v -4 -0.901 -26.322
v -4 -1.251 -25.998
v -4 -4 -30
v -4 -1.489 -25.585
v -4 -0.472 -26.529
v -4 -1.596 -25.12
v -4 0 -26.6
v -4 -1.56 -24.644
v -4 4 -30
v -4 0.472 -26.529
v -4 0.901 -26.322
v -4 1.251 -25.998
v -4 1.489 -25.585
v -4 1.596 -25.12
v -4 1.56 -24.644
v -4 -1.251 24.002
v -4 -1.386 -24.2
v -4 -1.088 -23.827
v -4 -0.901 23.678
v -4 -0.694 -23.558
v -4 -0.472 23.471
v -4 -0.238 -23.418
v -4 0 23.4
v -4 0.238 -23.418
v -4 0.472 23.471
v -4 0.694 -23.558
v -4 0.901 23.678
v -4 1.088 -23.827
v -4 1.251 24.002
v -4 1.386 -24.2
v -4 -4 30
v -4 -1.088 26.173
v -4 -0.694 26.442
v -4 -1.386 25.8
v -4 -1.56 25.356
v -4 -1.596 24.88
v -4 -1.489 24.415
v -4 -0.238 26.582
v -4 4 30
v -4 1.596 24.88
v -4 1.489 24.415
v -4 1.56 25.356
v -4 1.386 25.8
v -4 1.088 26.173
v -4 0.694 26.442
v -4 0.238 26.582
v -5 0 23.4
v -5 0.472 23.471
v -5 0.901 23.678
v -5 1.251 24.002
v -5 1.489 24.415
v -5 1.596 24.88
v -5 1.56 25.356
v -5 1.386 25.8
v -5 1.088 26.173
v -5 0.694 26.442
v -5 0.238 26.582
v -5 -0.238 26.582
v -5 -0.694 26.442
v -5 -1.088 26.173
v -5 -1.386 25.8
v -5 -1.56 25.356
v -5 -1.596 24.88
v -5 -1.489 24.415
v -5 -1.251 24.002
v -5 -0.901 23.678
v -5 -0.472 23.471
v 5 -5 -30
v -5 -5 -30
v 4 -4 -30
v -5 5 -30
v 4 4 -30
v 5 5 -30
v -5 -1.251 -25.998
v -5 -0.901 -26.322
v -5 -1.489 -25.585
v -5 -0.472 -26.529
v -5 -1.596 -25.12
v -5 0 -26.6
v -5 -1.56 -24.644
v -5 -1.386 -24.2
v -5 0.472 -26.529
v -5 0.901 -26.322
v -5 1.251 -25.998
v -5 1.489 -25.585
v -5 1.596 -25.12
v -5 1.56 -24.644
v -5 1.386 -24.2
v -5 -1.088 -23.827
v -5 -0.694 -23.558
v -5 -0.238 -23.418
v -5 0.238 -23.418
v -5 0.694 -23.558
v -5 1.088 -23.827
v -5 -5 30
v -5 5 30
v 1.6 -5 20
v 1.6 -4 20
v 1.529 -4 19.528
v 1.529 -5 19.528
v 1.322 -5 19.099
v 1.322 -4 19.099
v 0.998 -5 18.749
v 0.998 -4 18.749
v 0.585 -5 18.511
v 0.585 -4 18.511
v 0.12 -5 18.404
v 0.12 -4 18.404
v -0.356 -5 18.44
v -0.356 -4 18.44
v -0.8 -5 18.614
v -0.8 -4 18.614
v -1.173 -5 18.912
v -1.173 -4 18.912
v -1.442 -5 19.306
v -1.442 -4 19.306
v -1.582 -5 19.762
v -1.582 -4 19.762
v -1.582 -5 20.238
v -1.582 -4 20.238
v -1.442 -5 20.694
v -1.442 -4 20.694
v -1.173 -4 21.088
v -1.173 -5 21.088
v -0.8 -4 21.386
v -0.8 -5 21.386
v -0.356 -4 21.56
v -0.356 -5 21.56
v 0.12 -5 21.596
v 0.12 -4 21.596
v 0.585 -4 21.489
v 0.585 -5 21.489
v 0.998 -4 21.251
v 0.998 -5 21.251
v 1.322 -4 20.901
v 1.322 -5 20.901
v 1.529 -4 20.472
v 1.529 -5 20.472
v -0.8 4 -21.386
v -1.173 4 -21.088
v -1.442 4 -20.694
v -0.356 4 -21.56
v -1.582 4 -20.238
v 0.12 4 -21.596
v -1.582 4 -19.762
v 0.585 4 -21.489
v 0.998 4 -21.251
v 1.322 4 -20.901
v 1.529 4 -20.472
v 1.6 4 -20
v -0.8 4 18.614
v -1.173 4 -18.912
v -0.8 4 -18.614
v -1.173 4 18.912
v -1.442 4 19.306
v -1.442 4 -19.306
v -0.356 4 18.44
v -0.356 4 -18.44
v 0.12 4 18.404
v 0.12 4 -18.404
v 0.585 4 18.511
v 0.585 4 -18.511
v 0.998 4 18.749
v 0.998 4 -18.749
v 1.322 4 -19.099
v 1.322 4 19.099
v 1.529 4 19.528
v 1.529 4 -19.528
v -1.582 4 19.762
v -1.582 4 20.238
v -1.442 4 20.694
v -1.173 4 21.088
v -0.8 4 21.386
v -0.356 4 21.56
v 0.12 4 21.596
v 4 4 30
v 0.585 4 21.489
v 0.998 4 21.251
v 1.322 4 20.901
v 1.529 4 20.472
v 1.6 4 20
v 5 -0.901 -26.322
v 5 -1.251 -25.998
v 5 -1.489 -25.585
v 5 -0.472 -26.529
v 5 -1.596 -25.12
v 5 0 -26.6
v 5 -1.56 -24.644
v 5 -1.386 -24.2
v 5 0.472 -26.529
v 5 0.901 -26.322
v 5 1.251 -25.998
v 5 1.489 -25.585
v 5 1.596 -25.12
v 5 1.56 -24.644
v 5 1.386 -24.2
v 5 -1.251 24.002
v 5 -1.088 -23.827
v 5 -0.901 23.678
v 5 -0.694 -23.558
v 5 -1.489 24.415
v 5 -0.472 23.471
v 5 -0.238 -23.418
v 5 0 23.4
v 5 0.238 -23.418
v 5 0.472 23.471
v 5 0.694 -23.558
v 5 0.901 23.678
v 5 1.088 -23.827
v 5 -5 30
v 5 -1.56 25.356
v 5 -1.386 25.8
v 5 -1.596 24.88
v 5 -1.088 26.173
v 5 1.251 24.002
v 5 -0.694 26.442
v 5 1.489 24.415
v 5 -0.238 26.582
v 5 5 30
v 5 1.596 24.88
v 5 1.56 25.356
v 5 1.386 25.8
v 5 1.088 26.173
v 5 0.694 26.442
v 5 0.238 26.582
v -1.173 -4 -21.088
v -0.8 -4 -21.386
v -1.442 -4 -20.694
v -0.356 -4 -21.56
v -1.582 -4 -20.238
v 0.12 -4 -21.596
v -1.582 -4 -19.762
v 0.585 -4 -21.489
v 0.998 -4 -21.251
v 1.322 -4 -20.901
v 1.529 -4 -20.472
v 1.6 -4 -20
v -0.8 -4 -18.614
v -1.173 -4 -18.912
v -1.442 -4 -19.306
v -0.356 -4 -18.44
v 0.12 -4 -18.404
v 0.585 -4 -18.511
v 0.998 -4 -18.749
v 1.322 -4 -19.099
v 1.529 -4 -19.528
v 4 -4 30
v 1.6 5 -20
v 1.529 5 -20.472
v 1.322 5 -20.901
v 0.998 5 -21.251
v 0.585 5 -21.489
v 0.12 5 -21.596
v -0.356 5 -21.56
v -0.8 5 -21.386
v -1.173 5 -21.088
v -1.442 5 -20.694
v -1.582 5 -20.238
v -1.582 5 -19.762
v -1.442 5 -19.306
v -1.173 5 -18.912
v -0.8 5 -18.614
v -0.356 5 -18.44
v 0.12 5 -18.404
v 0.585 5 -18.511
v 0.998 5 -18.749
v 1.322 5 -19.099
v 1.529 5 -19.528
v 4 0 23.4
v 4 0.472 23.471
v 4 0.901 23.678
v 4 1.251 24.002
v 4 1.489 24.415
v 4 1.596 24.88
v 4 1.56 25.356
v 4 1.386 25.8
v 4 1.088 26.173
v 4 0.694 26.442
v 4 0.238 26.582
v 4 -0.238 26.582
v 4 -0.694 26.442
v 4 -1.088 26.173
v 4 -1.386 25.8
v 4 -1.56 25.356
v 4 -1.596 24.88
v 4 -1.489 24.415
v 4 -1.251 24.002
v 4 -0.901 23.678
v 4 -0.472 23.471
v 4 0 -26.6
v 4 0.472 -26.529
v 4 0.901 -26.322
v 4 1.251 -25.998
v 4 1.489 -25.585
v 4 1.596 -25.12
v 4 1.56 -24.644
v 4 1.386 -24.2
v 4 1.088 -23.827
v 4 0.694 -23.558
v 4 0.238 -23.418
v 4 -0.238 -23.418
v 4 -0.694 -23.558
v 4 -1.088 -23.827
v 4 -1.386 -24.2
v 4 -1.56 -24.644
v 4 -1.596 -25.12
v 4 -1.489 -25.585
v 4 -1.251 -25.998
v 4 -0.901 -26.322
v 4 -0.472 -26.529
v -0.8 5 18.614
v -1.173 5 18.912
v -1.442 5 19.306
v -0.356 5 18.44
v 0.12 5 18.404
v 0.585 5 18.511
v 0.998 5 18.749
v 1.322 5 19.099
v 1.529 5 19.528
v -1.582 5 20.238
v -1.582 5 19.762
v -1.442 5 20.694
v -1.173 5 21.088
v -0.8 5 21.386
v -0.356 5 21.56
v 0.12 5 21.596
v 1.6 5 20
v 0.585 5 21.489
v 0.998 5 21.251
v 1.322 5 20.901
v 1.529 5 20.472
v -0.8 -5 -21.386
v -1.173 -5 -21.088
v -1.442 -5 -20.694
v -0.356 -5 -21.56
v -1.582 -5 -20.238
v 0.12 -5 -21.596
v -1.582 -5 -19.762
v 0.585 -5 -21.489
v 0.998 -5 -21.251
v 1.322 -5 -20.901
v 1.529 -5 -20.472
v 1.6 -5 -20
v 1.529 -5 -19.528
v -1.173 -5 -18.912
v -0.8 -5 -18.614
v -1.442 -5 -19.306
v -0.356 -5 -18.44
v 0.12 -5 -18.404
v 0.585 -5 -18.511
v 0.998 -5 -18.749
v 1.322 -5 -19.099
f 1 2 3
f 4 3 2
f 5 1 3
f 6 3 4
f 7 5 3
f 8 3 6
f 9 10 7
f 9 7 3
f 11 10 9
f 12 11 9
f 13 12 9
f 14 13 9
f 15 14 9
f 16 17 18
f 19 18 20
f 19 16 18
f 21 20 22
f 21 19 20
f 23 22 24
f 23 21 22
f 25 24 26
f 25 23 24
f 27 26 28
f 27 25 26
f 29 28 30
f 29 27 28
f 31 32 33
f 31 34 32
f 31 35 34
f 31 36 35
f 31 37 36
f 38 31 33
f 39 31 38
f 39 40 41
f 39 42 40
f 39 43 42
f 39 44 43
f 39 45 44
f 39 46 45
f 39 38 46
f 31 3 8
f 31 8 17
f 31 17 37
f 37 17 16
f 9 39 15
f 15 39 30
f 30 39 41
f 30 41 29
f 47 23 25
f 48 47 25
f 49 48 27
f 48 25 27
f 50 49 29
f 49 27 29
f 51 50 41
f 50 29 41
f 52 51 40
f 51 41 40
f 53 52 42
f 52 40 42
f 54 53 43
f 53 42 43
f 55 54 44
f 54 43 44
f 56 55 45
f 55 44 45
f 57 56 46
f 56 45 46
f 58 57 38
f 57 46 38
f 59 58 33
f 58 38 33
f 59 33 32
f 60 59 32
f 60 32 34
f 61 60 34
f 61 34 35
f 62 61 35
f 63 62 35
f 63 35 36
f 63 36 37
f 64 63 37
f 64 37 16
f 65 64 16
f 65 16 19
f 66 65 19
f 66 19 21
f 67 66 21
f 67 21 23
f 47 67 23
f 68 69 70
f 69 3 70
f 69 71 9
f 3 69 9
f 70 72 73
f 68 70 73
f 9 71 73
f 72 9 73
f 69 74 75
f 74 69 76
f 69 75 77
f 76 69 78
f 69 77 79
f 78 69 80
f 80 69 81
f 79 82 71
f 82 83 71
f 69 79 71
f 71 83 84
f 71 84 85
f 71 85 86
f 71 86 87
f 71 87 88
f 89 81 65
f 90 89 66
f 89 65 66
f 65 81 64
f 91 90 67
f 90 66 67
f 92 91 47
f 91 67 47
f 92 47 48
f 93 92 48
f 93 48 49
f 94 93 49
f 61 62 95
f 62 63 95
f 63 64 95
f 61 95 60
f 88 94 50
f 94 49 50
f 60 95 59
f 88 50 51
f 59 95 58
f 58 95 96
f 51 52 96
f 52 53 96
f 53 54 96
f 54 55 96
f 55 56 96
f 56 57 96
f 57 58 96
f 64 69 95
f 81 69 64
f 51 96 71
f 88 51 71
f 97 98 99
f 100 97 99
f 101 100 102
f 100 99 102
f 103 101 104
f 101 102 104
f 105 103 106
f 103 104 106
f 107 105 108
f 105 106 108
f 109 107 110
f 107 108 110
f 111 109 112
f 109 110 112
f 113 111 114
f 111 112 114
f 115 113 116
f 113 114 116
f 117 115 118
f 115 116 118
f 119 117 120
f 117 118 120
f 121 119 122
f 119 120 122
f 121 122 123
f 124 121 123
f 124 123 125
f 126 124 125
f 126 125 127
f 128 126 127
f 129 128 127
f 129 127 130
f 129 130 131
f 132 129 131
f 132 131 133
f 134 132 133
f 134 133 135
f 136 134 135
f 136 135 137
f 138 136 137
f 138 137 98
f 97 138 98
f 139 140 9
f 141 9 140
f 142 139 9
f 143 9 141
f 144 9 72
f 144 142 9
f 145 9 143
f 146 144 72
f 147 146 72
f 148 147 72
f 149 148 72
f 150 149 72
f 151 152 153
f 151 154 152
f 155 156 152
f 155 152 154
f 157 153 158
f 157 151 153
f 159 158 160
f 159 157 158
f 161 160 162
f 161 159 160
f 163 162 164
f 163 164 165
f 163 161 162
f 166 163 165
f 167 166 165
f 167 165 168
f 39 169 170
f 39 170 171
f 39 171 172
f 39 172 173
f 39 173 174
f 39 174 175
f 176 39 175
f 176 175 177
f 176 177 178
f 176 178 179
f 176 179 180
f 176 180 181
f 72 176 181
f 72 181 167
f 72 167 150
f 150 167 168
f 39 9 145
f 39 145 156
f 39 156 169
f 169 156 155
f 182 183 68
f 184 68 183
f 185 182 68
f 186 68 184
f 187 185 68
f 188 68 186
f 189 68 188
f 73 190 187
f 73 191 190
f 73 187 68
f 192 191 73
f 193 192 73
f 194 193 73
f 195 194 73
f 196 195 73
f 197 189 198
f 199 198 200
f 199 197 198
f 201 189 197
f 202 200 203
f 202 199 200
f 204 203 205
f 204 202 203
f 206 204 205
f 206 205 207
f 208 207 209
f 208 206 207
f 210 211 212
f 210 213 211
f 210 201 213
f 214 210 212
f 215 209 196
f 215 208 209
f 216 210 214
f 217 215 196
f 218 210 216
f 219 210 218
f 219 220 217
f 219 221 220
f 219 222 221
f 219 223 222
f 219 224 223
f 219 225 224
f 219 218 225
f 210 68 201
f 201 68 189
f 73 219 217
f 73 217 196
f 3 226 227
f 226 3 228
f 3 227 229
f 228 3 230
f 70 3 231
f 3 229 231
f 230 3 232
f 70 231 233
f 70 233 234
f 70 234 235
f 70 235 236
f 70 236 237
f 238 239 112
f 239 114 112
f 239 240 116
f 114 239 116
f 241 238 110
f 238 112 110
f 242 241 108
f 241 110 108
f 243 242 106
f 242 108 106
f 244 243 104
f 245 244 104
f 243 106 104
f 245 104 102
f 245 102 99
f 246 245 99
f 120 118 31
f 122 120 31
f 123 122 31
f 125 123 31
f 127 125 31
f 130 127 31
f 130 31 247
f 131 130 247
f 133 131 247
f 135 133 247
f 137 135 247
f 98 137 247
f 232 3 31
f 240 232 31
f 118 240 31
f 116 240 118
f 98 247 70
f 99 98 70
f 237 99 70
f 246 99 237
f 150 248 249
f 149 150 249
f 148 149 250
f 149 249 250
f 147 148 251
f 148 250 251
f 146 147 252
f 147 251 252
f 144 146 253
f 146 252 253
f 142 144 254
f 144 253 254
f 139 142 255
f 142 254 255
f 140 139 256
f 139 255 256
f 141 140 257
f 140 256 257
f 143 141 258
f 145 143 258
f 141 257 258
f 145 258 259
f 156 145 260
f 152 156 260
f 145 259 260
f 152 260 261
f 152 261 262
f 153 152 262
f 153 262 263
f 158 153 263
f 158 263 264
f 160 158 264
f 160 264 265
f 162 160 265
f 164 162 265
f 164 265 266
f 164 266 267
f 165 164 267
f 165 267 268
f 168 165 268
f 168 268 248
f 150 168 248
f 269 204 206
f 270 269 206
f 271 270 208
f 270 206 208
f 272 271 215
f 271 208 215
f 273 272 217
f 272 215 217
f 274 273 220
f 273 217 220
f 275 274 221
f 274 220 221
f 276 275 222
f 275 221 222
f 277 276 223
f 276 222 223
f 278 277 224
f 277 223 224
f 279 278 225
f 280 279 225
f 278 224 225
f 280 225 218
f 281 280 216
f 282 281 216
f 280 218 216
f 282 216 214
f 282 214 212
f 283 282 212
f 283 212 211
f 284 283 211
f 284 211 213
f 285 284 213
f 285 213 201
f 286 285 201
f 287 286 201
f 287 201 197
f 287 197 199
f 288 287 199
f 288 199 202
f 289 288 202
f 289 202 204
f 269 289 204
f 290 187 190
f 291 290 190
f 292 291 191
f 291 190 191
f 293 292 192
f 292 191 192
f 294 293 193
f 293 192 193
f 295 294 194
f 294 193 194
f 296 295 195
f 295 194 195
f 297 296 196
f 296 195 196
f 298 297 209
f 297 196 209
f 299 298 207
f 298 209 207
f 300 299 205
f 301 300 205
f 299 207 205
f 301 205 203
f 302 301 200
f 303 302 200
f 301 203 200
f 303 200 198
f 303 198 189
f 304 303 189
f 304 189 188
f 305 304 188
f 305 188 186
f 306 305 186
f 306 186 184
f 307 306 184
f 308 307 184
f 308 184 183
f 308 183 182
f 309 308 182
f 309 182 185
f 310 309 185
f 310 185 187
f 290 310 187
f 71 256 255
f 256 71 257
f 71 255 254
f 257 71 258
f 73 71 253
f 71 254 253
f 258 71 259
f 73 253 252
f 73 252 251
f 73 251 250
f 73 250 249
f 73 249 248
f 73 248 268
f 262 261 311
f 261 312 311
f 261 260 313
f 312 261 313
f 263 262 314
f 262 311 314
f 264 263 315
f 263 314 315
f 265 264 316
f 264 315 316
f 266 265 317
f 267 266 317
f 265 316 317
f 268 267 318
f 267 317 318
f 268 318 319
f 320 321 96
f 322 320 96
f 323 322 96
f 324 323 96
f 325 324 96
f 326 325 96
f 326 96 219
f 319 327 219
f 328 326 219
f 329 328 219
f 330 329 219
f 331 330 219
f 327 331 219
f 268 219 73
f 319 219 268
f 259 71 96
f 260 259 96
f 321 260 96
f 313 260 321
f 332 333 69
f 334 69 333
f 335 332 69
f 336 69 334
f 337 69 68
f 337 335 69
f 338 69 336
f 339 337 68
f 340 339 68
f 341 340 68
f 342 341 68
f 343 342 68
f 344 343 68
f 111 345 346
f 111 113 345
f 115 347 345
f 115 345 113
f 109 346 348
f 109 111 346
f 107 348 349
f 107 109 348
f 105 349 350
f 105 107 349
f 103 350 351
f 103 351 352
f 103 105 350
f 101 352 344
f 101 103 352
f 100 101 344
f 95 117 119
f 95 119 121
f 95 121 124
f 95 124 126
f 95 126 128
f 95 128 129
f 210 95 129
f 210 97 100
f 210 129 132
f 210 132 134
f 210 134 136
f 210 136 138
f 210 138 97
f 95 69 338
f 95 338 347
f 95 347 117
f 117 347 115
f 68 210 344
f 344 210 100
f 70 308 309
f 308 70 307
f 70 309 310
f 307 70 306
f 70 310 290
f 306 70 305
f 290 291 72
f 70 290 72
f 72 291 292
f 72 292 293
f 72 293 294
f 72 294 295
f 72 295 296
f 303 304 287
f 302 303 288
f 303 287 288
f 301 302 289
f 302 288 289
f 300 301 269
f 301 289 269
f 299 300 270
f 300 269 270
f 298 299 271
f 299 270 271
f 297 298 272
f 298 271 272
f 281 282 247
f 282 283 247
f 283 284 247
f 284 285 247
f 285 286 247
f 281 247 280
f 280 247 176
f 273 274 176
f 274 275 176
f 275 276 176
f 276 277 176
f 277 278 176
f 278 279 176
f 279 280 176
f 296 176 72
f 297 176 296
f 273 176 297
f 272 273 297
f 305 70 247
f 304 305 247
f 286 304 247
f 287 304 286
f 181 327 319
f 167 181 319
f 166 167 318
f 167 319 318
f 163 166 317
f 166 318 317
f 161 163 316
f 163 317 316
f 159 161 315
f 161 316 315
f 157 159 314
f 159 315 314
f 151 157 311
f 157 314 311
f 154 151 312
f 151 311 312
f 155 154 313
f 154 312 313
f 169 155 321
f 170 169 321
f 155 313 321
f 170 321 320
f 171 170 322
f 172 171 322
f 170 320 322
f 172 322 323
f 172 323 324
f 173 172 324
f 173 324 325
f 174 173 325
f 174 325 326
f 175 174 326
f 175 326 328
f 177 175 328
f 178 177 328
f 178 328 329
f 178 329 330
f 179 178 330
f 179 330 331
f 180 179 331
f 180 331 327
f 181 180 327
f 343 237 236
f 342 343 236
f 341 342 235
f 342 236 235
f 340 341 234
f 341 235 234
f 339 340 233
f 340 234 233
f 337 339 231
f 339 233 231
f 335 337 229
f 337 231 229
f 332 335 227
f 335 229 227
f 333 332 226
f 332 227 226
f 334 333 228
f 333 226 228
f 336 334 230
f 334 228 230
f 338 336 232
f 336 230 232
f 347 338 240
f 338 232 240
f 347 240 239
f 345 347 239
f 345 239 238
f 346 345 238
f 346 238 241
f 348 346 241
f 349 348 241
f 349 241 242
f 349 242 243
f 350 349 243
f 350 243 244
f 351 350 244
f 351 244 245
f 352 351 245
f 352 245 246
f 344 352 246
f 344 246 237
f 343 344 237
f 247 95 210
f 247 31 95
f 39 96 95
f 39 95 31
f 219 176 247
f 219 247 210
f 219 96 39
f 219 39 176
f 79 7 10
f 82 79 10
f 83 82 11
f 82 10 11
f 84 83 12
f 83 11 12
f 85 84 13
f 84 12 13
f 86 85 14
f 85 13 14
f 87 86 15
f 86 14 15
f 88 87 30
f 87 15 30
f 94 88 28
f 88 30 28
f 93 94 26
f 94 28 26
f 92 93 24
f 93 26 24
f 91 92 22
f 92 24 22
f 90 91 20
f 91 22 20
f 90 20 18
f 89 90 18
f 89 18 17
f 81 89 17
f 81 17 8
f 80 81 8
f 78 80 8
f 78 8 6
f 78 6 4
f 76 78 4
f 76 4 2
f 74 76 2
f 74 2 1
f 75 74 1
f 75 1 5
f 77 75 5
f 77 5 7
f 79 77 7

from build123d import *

# Parameters (mm, degrees)
SKETCH_1_W          = 10
SKETCH_1_H          = 10
SKETCH_1_W_2        = 8
SKETCH_1_H_2        = 8
EXTRUDE_1_DEPTH     = 30
SKETCH_3_R          = 1.6
CUT_EXTRUDE_1_DEPTH = 11
SKETCH_4_R          = 1.6
CUT_EXTRUDE_2_DEPTH = 11


with BuildPart() as part:
    # ｽｹｯﾁ1 → ﾎﾞｽ - 押し出し1 (new body, symmetric)
    with BuildSketch(Plane.XY):
        Rectangle(SKETCH_1_W, SKETCH_1_H)
        Rectangle(SKETCH_1_W_2, SKETCH_1_H_2, mode=Mode.SUBTRACT)
    extrude(amount=EXTRUDE_1_DEPTH, both=True)

    # ｽｹｯﾁ3 → ｶｯﾄ - 押し出し1 (cut, through all)
    with BuildSketch(Plane(origin=(5, 0, 0), x_dir=(0, 0, -1), z_dir=(1, 0, 0))):
        with Locations((-25, 0)):
            Circle(SKETCH_3_R)
        with Locations((25, 0)):
            Circle(SKETCH_3_R)
    extrude(amount=-CUT_EXTRUDE_1_DEPTH, mode=Mode.SUBTRACT)

    # ｽｹｯﾁ4 → ｶｯﾄ - 押し出し2 (cut, through all)
    with BuildSketch(Plane(origin=(0, 5, 0), x_dir=(1, 0, 0), z_dir=(0, 1, 0))):
        with Locations((0, -20)):
            Circle(SKETCH_4_R)
        with Locations((0, 20)):
            Circle(SKETCH_4_R)
    extrude(amount=-CUT_EXTRUDE_2_DEPTH, mode=Mode.SUBTRACT)


solid = part.part
